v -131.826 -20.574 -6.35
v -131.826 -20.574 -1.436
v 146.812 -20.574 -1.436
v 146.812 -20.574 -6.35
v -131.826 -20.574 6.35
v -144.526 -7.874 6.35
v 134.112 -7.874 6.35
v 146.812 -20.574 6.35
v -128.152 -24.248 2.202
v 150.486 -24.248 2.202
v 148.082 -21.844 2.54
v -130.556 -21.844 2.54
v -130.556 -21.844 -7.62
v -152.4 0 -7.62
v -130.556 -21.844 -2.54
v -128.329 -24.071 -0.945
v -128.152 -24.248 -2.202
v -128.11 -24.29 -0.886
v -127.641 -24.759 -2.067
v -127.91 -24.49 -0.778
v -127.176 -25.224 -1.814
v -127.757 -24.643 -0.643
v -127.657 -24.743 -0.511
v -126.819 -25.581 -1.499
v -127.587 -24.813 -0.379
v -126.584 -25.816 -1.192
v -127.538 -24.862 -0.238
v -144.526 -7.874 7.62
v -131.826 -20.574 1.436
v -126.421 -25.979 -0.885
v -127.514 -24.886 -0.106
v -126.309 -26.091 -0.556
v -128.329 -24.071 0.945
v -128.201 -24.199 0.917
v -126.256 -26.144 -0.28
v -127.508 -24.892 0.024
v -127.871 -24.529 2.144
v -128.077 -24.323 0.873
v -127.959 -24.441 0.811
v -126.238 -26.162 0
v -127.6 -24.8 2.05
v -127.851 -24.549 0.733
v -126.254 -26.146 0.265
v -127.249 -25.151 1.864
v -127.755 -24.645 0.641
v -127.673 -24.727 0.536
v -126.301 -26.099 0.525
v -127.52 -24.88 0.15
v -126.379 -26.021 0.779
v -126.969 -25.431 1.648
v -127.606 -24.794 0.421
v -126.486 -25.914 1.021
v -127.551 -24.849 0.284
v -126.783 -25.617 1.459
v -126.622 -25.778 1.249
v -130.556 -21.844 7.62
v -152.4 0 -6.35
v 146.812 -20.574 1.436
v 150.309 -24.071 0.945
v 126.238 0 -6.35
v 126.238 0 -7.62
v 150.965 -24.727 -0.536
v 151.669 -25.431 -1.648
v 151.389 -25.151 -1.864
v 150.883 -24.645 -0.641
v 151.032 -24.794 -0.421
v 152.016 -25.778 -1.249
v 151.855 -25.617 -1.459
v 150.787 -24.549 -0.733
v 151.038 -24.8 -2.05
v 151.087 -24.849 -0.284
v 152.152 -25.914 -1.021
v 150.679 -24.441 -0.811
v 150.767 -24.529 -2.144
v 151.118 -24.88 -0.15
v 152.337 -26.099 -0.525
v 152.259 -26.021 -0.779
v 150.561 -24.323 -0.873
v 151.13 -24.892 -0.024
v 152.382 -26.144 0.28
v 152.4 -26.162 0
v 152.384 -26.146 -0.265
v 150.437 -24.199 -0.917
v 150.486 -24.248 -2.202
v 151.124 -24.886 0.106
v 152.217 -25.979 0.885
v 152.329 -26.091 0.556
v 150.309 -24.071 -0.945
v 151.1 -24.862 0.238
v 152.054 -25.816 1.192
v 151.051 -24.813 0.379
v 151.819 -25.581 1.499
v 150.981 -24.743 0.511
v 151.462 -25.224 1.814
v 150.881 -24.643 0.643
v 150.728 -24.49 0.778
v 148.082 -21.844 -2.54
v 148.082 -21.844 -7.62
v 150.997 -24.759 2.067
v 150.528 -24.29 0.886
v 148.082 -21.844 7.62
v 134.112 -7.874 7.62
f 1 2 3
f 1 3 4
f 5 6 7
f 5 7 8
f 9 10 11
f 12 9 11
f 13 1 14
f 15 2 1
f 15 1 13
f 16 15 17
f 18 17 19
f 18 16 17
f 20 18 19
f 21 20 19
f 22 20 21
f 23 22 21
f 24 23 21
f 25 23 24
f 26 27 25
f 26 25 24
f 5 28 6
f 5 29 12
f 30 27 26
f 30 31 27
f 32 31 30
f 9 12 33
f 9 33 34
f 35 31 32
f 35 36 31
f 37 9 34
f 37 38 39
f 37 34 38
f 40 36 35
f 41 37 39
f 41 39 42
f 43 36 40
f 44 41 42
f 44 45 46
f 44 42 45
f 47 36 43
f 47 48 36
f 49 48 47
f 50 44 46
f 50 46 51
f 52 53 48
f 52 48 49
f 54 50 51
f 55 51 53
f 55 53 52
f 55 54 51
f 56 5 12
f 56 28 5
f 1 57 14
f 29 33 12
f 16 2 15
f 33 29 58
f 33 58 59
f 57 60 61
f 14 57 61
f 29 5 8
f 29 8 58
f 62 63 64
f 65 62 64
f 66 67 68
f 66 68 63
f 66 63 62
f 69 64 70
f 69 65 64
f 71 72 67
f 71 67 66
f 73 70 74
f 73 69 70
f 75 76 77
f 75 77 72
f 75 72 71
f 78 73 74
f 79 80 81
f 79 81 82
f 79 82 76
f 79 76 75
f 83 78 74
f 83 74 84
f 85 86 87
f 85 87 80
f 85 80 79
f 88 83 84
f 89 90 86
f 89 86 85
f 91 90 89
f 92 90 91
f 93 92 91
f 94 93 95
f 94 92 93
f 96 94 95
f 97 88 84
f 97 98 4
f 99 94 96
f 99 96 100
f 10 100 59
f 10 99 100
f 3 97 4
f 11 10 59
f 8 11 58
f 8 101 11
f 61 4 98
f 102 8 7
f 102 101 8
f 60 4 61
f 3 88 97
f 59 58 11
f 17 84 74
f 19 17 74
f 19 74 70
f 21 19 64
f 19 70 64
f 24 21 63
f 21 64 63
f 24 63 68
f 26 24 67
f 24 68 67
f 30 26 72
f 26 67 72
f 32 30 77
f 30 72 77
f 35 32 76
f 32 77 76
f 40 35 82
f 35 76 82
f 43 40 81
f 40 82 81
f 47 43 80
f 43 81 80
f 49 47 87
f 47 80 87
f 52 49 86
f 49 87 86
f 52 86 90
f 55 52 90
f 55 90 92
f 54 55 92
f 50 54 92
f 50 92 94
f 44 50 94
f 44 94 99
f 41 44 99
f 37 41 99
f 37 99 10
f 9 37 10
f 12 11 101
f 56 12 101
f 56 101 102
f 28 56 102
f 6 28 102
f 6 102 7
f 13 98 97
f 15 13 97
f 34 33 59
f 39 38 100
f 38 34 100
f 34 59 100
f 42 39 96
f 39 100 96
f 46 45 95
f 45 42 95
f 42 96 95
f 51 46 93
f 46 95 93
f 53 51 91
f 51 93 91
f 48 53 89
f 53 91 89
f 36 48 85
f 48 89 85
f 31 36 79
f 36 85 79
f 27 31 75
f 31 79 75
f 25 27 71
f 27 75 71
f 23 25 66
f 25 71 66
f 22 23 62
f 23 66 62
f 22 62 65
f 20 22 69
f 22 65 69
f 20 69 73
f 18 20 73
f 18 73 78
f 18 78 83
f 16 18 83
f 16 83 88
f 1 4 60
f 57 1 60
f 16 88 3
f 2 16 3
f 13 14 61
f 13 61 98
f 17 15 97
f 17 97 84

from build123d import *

# Parameters (mm, degrees)
BOSS_EXTRUDE1_DEPTH         = 152.4
CUT_FRONT_LEFT_BOTTOM_DEPTH = 16.24
CUT_FRONT_RIGHT_TOP_DEPTH   = 16.24


with BuildPart() as part:
    # Sketch1 → Boss-Extrude1 (new body, symmetric)
    with BuildSketch(Plane(origin=(0, 0, 0), x_dir=(0, 0, -1), z_dir=(1, 0, 0))):
        with BuildLine():
            Line((7.62, 0), (7.62, -21.844))
            Line((7.62, -21.844), (2.54, -21.844))
            Line((2.54, -21.844), (2.202186415, -24.247668555))
            ThreePointArc((2.202186415, -24.247668555), (0, -26.162), (-2.202186415, -24.247668555))
            Line((-2.202186415, -24.247668555), (-2.54, -21.844))
            Line((-2.54, -21.844), (-7.62, -21.844))
            Line((-7.62, -21.844), (-7.62, -7.874))
            Line((-7.62, -7.874), (-6.35, -7.874))
            Line((-6.35, -7.874), (-6.35, -20.574))
            Line((-6.35, -20.574), (-1.436005843, -20.574))
            Line((-1.436005843, -20.574), (-0.944545968, -24.070918717))
            ThreePointArc((-0.944545968, -24.070918717), (0, -24.892), (0.944545968, -24.070918717))
            Line((0.944545968, -24.070918717), (1.436005843, -20.574))
            Line((1.436005843, -20.574), (6.35, -20.574))
            Line((6.35, -20.574), (6.35, 0))
            Line((6.35, 0), (7.62, 0))
        make_face()
    extrude(amount=BOSS_EXTRUDE1_DEPTH, both=True)

    # Sketch12 → Cut-Front-Left-Bottom (cut, through all)
    with BuildSketch(Plane.XY.offset(7.62)):
        Polygon((-152.4, 0), (-126.238, -26.162), (-152.4, -26.162), align=None)
    extrude(amount=-CUT_FRONT_LEFT_BOTTOM_DEPTH, mode=Mode.SUBTRACT)

    # Sketch7 → Cut-Front-Right-Top (cut, through all)
    with BuildSketch(Plane.XY.offset(7.62)):
        Polygon((152.4, -26.162), (126.238, 0), (152.4, 0), align=None)
    extrude(amount=-CUT_FRONT_RIGHT_TOP_DEPTH, mode=Mode.SUBTRACT)


solid = part.part
